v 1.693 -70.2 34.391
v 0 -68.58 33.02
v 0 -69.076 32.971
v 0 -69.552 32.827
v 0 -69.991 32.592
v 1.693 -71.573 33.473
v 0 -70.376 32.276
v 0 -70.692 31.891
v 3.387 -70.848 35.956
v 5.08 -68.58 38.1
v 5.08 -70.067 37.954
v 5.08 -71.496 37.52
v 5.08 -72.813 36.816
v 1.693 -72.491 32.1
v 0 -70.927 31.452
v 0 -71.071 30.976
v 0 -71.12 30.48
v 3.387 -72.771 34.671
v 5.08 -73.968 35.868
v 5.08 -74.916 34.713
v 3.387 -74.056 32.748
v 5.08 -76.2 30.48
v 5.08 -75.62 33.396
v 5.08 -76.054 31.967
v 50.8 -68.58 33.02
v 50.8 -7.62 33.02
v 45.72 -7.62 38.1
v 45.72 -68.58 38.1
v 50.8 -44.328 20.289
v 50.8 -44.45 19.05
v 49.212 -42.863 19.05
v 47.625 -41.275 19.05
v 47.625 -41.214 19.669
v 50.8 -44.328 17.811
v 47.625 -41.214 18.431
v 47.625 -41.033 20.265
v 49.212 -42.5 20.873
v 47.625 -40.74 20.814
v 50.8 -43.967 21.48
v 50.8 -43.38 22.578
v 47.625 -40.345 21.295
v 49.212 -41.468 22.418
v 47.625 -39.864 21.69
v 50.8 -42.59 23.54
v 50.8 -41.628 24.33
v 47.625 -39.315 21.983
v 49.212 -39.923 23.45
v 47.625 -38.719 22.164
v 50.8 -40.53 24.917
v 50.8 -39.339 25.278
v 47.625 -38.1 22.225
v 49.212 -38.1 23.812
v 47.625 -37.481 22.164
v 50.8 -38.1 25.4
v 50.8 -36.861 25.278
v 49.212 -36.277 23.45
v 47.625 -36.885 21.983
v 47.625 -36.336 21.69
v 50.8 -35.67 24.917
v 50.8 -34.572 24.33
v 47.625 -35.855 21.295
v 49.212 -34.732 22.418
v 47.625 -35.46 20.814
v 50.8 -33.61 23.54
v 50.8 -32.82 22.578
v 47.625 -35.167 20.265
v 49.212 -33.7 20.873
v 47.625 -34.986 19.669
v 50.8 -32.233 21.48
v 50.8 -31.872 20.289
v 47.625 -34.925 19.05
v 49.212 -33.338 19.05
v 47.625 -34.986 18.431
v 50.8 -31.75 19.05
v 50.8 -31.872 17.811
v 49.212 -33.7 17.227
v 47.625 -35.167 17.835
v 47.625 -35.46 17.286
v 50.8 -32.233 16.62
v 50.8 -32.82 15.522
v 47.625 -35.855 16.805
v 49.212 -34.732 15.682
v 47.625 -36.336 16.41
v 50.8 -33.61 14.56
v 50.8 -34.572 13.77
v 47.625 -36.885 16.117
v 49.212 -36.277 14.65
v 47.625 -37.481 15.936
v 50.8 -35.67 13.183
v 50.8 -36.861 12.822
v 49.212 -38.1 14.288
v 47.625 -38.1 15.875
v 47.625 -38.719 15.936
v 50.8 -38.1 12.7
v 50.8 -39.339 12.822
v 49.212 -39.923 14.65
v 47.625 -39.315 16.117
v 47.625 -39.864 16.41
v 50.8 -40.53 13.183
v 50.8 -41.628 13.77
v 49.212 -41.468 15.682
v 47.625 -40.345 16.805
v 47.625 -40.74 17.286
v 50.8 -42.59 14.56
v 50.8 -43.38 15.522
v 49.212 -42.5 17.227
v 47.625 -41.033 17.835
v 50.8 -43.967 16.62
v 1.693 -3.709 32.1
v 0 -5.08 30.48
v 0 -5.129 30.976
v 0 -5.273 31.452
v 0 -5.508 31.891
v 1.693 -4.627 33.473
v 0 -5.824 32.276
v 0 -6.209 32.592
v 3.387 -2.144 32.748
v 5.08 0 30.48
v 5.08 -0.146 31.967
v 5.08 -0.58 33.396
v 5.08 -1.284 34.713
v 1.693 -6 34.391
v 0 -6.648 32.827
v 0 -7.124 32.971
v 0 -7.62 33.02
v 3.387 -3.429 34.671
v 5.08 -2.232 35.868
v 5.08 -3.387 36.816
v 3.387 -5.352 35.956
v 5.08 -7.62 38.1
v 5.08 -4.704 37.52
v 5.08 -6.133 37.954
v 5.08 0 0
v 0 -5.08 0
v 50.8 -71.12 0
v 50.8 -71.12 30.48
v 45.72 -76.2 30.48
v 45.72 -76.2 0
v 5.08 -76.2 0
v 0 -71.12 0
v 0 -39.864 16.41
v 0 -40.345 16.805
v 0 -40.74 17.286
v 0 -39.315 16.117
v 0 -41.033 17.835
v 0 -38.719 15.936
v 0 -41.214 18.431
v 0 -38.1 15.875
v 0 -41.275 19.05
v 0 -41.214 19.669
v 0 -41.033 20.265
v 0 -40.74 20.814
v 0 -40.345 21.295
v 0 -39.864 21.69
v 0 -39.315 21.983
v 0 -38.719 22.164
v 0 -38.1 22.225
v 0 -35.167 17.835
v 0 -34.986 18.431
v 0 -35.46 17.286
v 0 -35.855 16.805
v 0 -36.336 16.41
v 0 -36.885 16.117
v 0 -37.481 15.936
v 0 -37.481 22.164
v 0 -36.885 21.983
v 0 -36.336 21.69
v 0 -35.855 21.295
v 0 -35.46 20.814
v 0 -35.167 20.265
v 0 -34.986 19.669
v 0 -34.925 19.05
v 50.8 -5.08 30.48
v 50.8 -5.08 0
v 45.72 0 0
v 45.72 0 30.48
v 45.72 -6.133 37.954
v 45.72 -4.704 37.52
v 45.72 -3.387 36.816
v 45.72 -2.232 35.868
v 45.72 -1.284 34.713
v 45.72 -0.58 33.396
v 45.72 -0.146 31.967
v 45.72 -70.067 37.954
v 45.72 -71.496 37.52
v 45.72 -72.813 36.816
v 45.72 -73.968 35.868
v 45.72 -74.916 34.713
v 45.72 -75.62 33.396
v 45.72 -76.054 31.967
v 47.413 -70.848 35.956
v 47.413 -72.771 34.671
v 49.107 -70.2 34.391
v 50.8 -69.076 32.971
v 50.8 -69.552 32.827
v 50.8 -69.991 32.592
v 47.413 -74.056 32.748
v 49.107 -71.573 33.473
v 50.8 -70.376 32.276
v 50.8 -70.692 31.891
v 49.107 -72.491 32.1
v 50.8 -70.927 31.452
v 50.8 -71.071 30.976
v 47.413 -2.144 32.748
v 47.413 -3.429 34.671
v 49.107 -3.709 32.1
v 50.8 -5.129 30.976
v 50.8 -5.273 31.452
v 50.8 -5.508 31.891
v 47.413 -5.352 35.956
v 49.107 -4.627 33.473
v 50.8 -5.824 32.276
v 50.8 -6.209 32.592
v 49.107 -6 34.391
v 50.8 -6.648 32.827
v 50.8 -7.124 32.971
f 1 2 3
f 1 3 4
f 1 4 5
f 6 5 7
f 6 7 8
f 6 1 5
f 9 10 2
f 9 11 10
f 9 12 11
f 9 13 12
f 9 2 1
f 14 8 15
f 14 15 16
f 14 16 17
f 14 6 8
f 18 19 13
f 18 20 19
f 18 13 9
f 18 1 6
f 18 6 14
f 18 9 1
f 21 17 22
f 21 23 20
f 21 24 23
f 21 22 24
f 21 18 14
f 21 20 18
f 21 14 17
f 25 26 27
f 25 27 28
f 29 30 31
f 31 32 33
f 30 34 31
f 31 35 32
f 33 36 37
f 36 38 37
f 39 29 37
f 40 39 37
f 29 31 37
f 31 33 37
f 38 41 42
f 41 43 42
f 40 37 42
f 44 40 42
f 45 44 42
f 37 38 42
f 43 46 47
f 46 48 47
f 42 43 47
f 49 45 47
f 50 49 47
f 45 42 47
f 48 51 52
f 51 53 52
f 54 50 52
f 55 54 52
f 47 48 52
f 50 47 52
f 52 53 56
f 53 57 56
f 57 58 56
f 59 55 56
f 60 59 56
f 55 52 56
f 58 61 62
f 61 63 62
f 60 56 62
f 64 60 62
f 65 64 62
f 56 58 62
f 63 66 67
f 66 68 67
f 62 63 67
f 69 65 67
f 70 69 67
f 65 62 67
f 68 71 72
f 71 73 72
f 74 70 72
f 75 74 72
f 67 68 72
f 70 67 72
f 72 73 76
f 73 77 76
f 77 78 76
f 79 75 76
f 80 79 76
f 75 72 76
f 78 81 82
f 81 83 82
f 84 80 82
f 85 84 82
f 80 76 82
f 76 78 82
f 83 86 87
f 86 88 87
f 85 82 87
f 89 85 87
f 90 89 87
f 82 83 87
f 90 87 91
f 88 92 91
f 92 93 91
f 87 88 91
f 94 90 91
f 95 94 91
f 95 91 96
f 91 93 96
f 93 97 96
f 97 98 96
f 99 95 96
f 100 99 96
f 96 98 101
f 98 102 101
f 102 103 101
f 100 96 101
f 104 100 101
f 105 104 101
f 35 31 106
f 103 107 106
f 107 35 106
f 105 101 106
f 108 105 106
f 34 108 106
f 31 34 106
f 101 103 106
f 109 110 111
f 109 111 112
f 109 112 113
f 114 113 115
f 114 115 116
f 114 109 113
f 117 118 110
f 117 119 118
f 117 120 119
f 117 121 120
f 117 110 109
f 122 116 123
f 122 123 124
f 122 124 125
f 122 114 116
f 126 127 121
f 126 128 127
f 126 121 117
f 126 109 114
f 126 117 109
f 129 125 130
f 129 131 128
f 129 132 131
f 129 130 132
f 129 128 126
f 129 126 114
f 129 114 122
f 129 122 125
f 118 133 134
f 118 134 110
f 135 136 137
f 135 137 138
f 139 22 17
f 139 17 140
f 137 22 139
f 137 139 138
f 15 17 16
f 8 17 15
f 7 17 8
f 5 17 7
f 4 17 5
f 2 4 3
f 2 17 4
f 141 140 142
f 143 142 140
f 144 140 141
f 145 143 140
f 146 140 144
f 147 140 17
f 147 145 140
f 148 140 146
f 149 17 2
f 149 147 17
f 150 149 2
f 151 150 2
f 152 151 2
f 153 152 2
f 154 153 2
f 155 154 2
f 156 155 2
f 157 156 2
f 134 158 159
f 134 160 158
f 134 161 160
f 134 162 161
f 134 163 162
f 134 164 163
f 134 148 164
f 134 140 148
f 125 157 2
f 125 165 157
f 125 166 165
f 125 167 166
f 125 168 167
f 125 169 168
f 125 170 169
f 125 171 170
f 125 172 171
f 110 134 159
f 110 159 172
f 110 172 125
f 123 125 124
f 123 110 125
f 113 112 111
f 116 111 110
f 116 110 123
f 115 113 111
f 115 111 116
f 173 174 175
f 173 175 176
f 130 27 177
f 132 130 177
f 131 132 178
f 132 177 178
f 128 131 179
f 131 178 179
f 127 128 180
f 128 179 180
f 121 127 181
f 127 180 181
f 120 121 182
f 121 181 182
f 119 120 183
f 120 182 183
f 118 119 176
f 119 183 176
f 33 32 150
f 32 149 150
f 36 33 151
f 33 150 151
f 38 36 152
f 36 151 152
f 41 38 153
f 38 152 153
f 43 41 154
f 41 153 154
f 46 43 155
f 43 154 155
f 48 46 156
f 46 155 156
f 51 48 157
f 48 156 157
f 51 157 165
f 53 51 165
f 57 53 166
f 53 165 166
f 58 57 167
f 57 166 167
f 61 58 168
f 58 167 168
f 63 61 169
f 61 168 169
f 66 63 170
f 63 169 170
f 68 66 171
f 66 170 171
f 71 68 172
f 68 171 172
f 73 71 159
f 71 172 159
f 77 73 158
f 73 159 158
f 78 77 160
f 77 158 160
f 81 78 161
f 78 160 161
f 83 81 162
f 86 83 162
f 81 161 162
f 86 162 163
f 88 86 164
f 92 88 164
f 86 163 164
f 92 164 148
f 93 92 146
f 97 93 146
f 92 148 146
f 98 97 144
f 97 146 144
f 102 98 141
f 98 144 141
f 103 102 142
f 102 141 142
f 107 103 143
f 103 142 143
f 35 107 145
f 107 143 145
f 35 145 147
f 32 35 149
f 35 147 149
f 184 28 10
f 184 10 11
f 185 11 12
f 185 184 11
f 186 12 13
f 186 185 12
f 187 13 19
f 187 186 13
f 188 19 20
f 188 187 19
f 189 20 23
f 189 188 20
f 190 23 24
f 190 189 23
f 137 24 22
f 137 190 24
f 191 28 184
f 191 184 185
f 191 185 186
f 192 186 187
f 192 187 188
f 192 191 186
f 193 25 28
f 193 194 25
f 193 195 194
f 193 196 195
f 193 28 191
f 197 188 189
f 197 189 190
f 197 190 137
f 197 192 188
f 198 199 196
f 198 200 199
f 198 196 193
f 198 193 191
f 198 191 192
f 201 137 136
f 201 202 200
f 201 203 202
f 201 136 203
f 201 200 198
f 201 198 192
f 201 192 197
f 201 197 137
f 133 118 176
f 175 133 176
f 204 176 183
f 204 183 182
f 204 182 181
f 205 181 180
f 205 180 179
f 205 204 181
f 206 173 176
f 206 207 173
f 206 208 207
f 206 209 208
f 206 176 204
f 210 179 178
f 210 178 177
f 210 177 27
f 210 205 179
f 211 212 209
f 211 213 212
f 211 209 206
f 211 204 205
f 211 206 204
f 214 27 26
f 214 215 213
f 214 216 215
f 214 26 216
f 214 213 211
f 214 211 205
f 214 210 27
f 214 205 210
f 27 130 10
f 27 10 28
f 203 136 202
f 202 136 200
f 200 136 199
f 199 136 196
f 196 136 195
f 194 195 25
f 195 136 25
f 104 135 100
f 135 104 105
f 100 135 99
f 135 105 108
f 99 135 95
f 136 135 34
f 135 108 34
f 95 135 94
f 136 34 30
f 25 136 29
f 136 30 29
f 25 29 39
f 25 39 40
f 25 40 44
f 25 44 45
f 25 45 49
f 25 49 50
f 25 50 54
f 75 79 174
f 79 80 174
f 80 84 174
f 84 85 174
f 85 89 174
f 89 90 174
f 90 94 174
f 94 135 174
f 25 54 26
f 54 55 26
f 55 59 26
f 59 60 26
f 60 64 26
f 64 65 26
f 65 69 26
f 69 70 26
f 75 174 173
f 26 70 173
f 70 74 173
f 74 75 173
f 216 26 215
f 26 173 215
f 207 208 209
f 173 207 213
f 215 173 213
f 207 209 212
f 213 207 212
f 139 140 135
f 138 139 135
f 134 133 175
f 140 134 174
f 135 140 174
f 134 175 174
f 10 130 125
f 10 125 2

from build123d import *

# Parameters (mm, degrees)
F0_W           = 50.8
F0_H           = 38.1
F1_DEPTH       = 76.2
F2_R           = 7.62
F3_SIZE        = 5.08
F5_D           = 6.35
F5_CSINK_D     = 12.7
F5_CSINK_ANGLE = 90


with BuildPart() as f1:
    # F0 (on Front) → F1 (new body)
    with BuildSketch(Plane.XZ):
        with Locations((25.4, 19.05)):
            Rectangle(F0_W, F0_H)
    extrude(amount=F1_DEPTH)

    # F2
    f2_edges = [f1.edges().sort_by_distance(p)[0] for p in [
        (25.4, -76.2, 38.1),
        (25.4, 0, 38.1),
    ]]
    fillet(f2_edges, radius=F2_R)

    # F3
    f3_edges = [f1.edges().sort_by_distance(p)[0] for p in [
        (50.8, -38.1, 38.1),
        (0, -38.1, 38.1),
    ]]
    chamfer(f3_edges, length=F3_SIZE)

    # F5 (through all)
    with Locations(Plane.YZ.offset(50.8)):
        with Locations((-38.1, 19.05)):
            CounterSinkHole(F5_D / 2, F5_CSINK_D / 2, counter_sink_angle=F5_CSINK_ANGLE)


solid = f1.part
